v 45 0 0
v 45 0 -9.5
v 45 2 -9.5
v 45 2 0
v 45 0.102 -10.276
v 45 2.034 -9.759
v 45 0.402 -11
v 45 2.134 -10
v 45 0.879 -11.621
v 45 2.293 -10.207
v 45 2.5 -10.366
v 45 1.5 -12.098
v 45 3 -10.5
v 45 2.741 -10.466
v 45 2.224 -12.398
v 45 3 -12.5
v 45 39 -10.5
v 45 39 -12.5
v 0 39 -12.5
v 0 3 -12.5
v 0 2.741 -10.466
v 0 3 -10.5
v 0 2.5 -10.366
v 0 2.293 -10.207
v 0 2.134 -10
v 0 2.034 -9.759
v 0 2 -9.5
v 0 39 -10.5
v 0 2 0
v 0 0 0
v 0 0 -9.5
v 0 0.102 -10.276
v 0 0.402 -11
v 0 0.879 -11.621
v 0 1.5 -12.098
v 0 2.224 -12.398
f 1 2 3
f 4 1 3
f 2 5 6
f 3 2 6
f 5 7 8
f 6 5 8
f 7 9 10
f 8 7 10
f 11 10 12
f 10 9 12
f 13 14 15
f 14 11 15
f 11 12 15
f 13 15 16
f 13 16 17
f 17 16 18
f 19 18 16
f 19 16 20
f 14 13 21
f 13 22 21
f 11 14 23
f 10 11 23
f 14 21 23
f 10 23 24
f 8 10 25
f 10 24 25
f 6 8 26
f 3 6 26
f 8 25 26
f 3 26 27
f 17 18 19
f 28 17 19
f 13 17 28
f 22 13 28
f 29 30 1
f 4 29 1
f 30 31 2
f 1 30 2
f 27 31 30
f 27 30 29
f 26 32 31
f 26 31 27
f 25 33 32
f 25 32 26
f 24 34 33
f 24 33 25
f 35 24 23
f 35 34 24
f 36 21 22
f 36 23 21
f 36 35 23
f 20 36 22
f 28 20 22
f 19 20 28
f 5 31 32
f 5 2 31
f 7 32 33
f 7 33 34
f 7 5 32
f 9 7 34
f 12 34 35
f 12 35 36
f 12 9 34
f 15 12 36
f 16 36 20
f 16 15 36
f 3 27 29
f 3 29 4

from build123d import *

# Parameters (mm, degrees)
SKETCH1_W           = 45
SKETCH1_H           = 12.5
BOSS_EXTRUDE1_DEPTH = 2
SKETCH2_W           = 45
SKETCH2_H           = 37
BOSS_EXTRUDE2_DEPTH = 2
FILLET1_R           = 1
FILLET2_R           = 3


with BuildPart() as part:
    # Sketch1 → Boss-Extrude1 (new body)
    with BuildSketch(Plane(origin=(0, 0, 0), x_dir=(1, 0, 0), z_dir=(0, 1, 0))):
        with Locations((22.5, 6.25)):
            Rectangle(SKETCH1_W, SKETCH1_H)
    extrude(amount=BOSS_EXTRUDE1_DEPTH)

    # Sketch2 → Boss-Extrude2 (add)
    with BuildSketch(Plane(origin=(0, 0, -12.5), x_dir=(-1, 0, 0), z_dir=(0, 0, -1))):
        with Locations((-22.5, 20.5)):
            Rectangle(SKETCH2_W, SKETCH2_H)
    extrude(amount=-BOSS_EXTRUDE2_DEPTH)

    # Fillet1
    fillet1_edges = [part.edges().sort_by_distance(p)[0] for p in [
        (22.5, 2, -10.5),
    ]]
    fillet(fillet1_edges, radius=FILLET1_R)

    # Fillet2
    fillet2_edges = [part.edges().sort_by_distance(p)[0] for p in [
        (22.5, 0, -12.5),
    ]]
    fillet(fillet2_edges, radius=FILLET2_R)


solid = part.part
